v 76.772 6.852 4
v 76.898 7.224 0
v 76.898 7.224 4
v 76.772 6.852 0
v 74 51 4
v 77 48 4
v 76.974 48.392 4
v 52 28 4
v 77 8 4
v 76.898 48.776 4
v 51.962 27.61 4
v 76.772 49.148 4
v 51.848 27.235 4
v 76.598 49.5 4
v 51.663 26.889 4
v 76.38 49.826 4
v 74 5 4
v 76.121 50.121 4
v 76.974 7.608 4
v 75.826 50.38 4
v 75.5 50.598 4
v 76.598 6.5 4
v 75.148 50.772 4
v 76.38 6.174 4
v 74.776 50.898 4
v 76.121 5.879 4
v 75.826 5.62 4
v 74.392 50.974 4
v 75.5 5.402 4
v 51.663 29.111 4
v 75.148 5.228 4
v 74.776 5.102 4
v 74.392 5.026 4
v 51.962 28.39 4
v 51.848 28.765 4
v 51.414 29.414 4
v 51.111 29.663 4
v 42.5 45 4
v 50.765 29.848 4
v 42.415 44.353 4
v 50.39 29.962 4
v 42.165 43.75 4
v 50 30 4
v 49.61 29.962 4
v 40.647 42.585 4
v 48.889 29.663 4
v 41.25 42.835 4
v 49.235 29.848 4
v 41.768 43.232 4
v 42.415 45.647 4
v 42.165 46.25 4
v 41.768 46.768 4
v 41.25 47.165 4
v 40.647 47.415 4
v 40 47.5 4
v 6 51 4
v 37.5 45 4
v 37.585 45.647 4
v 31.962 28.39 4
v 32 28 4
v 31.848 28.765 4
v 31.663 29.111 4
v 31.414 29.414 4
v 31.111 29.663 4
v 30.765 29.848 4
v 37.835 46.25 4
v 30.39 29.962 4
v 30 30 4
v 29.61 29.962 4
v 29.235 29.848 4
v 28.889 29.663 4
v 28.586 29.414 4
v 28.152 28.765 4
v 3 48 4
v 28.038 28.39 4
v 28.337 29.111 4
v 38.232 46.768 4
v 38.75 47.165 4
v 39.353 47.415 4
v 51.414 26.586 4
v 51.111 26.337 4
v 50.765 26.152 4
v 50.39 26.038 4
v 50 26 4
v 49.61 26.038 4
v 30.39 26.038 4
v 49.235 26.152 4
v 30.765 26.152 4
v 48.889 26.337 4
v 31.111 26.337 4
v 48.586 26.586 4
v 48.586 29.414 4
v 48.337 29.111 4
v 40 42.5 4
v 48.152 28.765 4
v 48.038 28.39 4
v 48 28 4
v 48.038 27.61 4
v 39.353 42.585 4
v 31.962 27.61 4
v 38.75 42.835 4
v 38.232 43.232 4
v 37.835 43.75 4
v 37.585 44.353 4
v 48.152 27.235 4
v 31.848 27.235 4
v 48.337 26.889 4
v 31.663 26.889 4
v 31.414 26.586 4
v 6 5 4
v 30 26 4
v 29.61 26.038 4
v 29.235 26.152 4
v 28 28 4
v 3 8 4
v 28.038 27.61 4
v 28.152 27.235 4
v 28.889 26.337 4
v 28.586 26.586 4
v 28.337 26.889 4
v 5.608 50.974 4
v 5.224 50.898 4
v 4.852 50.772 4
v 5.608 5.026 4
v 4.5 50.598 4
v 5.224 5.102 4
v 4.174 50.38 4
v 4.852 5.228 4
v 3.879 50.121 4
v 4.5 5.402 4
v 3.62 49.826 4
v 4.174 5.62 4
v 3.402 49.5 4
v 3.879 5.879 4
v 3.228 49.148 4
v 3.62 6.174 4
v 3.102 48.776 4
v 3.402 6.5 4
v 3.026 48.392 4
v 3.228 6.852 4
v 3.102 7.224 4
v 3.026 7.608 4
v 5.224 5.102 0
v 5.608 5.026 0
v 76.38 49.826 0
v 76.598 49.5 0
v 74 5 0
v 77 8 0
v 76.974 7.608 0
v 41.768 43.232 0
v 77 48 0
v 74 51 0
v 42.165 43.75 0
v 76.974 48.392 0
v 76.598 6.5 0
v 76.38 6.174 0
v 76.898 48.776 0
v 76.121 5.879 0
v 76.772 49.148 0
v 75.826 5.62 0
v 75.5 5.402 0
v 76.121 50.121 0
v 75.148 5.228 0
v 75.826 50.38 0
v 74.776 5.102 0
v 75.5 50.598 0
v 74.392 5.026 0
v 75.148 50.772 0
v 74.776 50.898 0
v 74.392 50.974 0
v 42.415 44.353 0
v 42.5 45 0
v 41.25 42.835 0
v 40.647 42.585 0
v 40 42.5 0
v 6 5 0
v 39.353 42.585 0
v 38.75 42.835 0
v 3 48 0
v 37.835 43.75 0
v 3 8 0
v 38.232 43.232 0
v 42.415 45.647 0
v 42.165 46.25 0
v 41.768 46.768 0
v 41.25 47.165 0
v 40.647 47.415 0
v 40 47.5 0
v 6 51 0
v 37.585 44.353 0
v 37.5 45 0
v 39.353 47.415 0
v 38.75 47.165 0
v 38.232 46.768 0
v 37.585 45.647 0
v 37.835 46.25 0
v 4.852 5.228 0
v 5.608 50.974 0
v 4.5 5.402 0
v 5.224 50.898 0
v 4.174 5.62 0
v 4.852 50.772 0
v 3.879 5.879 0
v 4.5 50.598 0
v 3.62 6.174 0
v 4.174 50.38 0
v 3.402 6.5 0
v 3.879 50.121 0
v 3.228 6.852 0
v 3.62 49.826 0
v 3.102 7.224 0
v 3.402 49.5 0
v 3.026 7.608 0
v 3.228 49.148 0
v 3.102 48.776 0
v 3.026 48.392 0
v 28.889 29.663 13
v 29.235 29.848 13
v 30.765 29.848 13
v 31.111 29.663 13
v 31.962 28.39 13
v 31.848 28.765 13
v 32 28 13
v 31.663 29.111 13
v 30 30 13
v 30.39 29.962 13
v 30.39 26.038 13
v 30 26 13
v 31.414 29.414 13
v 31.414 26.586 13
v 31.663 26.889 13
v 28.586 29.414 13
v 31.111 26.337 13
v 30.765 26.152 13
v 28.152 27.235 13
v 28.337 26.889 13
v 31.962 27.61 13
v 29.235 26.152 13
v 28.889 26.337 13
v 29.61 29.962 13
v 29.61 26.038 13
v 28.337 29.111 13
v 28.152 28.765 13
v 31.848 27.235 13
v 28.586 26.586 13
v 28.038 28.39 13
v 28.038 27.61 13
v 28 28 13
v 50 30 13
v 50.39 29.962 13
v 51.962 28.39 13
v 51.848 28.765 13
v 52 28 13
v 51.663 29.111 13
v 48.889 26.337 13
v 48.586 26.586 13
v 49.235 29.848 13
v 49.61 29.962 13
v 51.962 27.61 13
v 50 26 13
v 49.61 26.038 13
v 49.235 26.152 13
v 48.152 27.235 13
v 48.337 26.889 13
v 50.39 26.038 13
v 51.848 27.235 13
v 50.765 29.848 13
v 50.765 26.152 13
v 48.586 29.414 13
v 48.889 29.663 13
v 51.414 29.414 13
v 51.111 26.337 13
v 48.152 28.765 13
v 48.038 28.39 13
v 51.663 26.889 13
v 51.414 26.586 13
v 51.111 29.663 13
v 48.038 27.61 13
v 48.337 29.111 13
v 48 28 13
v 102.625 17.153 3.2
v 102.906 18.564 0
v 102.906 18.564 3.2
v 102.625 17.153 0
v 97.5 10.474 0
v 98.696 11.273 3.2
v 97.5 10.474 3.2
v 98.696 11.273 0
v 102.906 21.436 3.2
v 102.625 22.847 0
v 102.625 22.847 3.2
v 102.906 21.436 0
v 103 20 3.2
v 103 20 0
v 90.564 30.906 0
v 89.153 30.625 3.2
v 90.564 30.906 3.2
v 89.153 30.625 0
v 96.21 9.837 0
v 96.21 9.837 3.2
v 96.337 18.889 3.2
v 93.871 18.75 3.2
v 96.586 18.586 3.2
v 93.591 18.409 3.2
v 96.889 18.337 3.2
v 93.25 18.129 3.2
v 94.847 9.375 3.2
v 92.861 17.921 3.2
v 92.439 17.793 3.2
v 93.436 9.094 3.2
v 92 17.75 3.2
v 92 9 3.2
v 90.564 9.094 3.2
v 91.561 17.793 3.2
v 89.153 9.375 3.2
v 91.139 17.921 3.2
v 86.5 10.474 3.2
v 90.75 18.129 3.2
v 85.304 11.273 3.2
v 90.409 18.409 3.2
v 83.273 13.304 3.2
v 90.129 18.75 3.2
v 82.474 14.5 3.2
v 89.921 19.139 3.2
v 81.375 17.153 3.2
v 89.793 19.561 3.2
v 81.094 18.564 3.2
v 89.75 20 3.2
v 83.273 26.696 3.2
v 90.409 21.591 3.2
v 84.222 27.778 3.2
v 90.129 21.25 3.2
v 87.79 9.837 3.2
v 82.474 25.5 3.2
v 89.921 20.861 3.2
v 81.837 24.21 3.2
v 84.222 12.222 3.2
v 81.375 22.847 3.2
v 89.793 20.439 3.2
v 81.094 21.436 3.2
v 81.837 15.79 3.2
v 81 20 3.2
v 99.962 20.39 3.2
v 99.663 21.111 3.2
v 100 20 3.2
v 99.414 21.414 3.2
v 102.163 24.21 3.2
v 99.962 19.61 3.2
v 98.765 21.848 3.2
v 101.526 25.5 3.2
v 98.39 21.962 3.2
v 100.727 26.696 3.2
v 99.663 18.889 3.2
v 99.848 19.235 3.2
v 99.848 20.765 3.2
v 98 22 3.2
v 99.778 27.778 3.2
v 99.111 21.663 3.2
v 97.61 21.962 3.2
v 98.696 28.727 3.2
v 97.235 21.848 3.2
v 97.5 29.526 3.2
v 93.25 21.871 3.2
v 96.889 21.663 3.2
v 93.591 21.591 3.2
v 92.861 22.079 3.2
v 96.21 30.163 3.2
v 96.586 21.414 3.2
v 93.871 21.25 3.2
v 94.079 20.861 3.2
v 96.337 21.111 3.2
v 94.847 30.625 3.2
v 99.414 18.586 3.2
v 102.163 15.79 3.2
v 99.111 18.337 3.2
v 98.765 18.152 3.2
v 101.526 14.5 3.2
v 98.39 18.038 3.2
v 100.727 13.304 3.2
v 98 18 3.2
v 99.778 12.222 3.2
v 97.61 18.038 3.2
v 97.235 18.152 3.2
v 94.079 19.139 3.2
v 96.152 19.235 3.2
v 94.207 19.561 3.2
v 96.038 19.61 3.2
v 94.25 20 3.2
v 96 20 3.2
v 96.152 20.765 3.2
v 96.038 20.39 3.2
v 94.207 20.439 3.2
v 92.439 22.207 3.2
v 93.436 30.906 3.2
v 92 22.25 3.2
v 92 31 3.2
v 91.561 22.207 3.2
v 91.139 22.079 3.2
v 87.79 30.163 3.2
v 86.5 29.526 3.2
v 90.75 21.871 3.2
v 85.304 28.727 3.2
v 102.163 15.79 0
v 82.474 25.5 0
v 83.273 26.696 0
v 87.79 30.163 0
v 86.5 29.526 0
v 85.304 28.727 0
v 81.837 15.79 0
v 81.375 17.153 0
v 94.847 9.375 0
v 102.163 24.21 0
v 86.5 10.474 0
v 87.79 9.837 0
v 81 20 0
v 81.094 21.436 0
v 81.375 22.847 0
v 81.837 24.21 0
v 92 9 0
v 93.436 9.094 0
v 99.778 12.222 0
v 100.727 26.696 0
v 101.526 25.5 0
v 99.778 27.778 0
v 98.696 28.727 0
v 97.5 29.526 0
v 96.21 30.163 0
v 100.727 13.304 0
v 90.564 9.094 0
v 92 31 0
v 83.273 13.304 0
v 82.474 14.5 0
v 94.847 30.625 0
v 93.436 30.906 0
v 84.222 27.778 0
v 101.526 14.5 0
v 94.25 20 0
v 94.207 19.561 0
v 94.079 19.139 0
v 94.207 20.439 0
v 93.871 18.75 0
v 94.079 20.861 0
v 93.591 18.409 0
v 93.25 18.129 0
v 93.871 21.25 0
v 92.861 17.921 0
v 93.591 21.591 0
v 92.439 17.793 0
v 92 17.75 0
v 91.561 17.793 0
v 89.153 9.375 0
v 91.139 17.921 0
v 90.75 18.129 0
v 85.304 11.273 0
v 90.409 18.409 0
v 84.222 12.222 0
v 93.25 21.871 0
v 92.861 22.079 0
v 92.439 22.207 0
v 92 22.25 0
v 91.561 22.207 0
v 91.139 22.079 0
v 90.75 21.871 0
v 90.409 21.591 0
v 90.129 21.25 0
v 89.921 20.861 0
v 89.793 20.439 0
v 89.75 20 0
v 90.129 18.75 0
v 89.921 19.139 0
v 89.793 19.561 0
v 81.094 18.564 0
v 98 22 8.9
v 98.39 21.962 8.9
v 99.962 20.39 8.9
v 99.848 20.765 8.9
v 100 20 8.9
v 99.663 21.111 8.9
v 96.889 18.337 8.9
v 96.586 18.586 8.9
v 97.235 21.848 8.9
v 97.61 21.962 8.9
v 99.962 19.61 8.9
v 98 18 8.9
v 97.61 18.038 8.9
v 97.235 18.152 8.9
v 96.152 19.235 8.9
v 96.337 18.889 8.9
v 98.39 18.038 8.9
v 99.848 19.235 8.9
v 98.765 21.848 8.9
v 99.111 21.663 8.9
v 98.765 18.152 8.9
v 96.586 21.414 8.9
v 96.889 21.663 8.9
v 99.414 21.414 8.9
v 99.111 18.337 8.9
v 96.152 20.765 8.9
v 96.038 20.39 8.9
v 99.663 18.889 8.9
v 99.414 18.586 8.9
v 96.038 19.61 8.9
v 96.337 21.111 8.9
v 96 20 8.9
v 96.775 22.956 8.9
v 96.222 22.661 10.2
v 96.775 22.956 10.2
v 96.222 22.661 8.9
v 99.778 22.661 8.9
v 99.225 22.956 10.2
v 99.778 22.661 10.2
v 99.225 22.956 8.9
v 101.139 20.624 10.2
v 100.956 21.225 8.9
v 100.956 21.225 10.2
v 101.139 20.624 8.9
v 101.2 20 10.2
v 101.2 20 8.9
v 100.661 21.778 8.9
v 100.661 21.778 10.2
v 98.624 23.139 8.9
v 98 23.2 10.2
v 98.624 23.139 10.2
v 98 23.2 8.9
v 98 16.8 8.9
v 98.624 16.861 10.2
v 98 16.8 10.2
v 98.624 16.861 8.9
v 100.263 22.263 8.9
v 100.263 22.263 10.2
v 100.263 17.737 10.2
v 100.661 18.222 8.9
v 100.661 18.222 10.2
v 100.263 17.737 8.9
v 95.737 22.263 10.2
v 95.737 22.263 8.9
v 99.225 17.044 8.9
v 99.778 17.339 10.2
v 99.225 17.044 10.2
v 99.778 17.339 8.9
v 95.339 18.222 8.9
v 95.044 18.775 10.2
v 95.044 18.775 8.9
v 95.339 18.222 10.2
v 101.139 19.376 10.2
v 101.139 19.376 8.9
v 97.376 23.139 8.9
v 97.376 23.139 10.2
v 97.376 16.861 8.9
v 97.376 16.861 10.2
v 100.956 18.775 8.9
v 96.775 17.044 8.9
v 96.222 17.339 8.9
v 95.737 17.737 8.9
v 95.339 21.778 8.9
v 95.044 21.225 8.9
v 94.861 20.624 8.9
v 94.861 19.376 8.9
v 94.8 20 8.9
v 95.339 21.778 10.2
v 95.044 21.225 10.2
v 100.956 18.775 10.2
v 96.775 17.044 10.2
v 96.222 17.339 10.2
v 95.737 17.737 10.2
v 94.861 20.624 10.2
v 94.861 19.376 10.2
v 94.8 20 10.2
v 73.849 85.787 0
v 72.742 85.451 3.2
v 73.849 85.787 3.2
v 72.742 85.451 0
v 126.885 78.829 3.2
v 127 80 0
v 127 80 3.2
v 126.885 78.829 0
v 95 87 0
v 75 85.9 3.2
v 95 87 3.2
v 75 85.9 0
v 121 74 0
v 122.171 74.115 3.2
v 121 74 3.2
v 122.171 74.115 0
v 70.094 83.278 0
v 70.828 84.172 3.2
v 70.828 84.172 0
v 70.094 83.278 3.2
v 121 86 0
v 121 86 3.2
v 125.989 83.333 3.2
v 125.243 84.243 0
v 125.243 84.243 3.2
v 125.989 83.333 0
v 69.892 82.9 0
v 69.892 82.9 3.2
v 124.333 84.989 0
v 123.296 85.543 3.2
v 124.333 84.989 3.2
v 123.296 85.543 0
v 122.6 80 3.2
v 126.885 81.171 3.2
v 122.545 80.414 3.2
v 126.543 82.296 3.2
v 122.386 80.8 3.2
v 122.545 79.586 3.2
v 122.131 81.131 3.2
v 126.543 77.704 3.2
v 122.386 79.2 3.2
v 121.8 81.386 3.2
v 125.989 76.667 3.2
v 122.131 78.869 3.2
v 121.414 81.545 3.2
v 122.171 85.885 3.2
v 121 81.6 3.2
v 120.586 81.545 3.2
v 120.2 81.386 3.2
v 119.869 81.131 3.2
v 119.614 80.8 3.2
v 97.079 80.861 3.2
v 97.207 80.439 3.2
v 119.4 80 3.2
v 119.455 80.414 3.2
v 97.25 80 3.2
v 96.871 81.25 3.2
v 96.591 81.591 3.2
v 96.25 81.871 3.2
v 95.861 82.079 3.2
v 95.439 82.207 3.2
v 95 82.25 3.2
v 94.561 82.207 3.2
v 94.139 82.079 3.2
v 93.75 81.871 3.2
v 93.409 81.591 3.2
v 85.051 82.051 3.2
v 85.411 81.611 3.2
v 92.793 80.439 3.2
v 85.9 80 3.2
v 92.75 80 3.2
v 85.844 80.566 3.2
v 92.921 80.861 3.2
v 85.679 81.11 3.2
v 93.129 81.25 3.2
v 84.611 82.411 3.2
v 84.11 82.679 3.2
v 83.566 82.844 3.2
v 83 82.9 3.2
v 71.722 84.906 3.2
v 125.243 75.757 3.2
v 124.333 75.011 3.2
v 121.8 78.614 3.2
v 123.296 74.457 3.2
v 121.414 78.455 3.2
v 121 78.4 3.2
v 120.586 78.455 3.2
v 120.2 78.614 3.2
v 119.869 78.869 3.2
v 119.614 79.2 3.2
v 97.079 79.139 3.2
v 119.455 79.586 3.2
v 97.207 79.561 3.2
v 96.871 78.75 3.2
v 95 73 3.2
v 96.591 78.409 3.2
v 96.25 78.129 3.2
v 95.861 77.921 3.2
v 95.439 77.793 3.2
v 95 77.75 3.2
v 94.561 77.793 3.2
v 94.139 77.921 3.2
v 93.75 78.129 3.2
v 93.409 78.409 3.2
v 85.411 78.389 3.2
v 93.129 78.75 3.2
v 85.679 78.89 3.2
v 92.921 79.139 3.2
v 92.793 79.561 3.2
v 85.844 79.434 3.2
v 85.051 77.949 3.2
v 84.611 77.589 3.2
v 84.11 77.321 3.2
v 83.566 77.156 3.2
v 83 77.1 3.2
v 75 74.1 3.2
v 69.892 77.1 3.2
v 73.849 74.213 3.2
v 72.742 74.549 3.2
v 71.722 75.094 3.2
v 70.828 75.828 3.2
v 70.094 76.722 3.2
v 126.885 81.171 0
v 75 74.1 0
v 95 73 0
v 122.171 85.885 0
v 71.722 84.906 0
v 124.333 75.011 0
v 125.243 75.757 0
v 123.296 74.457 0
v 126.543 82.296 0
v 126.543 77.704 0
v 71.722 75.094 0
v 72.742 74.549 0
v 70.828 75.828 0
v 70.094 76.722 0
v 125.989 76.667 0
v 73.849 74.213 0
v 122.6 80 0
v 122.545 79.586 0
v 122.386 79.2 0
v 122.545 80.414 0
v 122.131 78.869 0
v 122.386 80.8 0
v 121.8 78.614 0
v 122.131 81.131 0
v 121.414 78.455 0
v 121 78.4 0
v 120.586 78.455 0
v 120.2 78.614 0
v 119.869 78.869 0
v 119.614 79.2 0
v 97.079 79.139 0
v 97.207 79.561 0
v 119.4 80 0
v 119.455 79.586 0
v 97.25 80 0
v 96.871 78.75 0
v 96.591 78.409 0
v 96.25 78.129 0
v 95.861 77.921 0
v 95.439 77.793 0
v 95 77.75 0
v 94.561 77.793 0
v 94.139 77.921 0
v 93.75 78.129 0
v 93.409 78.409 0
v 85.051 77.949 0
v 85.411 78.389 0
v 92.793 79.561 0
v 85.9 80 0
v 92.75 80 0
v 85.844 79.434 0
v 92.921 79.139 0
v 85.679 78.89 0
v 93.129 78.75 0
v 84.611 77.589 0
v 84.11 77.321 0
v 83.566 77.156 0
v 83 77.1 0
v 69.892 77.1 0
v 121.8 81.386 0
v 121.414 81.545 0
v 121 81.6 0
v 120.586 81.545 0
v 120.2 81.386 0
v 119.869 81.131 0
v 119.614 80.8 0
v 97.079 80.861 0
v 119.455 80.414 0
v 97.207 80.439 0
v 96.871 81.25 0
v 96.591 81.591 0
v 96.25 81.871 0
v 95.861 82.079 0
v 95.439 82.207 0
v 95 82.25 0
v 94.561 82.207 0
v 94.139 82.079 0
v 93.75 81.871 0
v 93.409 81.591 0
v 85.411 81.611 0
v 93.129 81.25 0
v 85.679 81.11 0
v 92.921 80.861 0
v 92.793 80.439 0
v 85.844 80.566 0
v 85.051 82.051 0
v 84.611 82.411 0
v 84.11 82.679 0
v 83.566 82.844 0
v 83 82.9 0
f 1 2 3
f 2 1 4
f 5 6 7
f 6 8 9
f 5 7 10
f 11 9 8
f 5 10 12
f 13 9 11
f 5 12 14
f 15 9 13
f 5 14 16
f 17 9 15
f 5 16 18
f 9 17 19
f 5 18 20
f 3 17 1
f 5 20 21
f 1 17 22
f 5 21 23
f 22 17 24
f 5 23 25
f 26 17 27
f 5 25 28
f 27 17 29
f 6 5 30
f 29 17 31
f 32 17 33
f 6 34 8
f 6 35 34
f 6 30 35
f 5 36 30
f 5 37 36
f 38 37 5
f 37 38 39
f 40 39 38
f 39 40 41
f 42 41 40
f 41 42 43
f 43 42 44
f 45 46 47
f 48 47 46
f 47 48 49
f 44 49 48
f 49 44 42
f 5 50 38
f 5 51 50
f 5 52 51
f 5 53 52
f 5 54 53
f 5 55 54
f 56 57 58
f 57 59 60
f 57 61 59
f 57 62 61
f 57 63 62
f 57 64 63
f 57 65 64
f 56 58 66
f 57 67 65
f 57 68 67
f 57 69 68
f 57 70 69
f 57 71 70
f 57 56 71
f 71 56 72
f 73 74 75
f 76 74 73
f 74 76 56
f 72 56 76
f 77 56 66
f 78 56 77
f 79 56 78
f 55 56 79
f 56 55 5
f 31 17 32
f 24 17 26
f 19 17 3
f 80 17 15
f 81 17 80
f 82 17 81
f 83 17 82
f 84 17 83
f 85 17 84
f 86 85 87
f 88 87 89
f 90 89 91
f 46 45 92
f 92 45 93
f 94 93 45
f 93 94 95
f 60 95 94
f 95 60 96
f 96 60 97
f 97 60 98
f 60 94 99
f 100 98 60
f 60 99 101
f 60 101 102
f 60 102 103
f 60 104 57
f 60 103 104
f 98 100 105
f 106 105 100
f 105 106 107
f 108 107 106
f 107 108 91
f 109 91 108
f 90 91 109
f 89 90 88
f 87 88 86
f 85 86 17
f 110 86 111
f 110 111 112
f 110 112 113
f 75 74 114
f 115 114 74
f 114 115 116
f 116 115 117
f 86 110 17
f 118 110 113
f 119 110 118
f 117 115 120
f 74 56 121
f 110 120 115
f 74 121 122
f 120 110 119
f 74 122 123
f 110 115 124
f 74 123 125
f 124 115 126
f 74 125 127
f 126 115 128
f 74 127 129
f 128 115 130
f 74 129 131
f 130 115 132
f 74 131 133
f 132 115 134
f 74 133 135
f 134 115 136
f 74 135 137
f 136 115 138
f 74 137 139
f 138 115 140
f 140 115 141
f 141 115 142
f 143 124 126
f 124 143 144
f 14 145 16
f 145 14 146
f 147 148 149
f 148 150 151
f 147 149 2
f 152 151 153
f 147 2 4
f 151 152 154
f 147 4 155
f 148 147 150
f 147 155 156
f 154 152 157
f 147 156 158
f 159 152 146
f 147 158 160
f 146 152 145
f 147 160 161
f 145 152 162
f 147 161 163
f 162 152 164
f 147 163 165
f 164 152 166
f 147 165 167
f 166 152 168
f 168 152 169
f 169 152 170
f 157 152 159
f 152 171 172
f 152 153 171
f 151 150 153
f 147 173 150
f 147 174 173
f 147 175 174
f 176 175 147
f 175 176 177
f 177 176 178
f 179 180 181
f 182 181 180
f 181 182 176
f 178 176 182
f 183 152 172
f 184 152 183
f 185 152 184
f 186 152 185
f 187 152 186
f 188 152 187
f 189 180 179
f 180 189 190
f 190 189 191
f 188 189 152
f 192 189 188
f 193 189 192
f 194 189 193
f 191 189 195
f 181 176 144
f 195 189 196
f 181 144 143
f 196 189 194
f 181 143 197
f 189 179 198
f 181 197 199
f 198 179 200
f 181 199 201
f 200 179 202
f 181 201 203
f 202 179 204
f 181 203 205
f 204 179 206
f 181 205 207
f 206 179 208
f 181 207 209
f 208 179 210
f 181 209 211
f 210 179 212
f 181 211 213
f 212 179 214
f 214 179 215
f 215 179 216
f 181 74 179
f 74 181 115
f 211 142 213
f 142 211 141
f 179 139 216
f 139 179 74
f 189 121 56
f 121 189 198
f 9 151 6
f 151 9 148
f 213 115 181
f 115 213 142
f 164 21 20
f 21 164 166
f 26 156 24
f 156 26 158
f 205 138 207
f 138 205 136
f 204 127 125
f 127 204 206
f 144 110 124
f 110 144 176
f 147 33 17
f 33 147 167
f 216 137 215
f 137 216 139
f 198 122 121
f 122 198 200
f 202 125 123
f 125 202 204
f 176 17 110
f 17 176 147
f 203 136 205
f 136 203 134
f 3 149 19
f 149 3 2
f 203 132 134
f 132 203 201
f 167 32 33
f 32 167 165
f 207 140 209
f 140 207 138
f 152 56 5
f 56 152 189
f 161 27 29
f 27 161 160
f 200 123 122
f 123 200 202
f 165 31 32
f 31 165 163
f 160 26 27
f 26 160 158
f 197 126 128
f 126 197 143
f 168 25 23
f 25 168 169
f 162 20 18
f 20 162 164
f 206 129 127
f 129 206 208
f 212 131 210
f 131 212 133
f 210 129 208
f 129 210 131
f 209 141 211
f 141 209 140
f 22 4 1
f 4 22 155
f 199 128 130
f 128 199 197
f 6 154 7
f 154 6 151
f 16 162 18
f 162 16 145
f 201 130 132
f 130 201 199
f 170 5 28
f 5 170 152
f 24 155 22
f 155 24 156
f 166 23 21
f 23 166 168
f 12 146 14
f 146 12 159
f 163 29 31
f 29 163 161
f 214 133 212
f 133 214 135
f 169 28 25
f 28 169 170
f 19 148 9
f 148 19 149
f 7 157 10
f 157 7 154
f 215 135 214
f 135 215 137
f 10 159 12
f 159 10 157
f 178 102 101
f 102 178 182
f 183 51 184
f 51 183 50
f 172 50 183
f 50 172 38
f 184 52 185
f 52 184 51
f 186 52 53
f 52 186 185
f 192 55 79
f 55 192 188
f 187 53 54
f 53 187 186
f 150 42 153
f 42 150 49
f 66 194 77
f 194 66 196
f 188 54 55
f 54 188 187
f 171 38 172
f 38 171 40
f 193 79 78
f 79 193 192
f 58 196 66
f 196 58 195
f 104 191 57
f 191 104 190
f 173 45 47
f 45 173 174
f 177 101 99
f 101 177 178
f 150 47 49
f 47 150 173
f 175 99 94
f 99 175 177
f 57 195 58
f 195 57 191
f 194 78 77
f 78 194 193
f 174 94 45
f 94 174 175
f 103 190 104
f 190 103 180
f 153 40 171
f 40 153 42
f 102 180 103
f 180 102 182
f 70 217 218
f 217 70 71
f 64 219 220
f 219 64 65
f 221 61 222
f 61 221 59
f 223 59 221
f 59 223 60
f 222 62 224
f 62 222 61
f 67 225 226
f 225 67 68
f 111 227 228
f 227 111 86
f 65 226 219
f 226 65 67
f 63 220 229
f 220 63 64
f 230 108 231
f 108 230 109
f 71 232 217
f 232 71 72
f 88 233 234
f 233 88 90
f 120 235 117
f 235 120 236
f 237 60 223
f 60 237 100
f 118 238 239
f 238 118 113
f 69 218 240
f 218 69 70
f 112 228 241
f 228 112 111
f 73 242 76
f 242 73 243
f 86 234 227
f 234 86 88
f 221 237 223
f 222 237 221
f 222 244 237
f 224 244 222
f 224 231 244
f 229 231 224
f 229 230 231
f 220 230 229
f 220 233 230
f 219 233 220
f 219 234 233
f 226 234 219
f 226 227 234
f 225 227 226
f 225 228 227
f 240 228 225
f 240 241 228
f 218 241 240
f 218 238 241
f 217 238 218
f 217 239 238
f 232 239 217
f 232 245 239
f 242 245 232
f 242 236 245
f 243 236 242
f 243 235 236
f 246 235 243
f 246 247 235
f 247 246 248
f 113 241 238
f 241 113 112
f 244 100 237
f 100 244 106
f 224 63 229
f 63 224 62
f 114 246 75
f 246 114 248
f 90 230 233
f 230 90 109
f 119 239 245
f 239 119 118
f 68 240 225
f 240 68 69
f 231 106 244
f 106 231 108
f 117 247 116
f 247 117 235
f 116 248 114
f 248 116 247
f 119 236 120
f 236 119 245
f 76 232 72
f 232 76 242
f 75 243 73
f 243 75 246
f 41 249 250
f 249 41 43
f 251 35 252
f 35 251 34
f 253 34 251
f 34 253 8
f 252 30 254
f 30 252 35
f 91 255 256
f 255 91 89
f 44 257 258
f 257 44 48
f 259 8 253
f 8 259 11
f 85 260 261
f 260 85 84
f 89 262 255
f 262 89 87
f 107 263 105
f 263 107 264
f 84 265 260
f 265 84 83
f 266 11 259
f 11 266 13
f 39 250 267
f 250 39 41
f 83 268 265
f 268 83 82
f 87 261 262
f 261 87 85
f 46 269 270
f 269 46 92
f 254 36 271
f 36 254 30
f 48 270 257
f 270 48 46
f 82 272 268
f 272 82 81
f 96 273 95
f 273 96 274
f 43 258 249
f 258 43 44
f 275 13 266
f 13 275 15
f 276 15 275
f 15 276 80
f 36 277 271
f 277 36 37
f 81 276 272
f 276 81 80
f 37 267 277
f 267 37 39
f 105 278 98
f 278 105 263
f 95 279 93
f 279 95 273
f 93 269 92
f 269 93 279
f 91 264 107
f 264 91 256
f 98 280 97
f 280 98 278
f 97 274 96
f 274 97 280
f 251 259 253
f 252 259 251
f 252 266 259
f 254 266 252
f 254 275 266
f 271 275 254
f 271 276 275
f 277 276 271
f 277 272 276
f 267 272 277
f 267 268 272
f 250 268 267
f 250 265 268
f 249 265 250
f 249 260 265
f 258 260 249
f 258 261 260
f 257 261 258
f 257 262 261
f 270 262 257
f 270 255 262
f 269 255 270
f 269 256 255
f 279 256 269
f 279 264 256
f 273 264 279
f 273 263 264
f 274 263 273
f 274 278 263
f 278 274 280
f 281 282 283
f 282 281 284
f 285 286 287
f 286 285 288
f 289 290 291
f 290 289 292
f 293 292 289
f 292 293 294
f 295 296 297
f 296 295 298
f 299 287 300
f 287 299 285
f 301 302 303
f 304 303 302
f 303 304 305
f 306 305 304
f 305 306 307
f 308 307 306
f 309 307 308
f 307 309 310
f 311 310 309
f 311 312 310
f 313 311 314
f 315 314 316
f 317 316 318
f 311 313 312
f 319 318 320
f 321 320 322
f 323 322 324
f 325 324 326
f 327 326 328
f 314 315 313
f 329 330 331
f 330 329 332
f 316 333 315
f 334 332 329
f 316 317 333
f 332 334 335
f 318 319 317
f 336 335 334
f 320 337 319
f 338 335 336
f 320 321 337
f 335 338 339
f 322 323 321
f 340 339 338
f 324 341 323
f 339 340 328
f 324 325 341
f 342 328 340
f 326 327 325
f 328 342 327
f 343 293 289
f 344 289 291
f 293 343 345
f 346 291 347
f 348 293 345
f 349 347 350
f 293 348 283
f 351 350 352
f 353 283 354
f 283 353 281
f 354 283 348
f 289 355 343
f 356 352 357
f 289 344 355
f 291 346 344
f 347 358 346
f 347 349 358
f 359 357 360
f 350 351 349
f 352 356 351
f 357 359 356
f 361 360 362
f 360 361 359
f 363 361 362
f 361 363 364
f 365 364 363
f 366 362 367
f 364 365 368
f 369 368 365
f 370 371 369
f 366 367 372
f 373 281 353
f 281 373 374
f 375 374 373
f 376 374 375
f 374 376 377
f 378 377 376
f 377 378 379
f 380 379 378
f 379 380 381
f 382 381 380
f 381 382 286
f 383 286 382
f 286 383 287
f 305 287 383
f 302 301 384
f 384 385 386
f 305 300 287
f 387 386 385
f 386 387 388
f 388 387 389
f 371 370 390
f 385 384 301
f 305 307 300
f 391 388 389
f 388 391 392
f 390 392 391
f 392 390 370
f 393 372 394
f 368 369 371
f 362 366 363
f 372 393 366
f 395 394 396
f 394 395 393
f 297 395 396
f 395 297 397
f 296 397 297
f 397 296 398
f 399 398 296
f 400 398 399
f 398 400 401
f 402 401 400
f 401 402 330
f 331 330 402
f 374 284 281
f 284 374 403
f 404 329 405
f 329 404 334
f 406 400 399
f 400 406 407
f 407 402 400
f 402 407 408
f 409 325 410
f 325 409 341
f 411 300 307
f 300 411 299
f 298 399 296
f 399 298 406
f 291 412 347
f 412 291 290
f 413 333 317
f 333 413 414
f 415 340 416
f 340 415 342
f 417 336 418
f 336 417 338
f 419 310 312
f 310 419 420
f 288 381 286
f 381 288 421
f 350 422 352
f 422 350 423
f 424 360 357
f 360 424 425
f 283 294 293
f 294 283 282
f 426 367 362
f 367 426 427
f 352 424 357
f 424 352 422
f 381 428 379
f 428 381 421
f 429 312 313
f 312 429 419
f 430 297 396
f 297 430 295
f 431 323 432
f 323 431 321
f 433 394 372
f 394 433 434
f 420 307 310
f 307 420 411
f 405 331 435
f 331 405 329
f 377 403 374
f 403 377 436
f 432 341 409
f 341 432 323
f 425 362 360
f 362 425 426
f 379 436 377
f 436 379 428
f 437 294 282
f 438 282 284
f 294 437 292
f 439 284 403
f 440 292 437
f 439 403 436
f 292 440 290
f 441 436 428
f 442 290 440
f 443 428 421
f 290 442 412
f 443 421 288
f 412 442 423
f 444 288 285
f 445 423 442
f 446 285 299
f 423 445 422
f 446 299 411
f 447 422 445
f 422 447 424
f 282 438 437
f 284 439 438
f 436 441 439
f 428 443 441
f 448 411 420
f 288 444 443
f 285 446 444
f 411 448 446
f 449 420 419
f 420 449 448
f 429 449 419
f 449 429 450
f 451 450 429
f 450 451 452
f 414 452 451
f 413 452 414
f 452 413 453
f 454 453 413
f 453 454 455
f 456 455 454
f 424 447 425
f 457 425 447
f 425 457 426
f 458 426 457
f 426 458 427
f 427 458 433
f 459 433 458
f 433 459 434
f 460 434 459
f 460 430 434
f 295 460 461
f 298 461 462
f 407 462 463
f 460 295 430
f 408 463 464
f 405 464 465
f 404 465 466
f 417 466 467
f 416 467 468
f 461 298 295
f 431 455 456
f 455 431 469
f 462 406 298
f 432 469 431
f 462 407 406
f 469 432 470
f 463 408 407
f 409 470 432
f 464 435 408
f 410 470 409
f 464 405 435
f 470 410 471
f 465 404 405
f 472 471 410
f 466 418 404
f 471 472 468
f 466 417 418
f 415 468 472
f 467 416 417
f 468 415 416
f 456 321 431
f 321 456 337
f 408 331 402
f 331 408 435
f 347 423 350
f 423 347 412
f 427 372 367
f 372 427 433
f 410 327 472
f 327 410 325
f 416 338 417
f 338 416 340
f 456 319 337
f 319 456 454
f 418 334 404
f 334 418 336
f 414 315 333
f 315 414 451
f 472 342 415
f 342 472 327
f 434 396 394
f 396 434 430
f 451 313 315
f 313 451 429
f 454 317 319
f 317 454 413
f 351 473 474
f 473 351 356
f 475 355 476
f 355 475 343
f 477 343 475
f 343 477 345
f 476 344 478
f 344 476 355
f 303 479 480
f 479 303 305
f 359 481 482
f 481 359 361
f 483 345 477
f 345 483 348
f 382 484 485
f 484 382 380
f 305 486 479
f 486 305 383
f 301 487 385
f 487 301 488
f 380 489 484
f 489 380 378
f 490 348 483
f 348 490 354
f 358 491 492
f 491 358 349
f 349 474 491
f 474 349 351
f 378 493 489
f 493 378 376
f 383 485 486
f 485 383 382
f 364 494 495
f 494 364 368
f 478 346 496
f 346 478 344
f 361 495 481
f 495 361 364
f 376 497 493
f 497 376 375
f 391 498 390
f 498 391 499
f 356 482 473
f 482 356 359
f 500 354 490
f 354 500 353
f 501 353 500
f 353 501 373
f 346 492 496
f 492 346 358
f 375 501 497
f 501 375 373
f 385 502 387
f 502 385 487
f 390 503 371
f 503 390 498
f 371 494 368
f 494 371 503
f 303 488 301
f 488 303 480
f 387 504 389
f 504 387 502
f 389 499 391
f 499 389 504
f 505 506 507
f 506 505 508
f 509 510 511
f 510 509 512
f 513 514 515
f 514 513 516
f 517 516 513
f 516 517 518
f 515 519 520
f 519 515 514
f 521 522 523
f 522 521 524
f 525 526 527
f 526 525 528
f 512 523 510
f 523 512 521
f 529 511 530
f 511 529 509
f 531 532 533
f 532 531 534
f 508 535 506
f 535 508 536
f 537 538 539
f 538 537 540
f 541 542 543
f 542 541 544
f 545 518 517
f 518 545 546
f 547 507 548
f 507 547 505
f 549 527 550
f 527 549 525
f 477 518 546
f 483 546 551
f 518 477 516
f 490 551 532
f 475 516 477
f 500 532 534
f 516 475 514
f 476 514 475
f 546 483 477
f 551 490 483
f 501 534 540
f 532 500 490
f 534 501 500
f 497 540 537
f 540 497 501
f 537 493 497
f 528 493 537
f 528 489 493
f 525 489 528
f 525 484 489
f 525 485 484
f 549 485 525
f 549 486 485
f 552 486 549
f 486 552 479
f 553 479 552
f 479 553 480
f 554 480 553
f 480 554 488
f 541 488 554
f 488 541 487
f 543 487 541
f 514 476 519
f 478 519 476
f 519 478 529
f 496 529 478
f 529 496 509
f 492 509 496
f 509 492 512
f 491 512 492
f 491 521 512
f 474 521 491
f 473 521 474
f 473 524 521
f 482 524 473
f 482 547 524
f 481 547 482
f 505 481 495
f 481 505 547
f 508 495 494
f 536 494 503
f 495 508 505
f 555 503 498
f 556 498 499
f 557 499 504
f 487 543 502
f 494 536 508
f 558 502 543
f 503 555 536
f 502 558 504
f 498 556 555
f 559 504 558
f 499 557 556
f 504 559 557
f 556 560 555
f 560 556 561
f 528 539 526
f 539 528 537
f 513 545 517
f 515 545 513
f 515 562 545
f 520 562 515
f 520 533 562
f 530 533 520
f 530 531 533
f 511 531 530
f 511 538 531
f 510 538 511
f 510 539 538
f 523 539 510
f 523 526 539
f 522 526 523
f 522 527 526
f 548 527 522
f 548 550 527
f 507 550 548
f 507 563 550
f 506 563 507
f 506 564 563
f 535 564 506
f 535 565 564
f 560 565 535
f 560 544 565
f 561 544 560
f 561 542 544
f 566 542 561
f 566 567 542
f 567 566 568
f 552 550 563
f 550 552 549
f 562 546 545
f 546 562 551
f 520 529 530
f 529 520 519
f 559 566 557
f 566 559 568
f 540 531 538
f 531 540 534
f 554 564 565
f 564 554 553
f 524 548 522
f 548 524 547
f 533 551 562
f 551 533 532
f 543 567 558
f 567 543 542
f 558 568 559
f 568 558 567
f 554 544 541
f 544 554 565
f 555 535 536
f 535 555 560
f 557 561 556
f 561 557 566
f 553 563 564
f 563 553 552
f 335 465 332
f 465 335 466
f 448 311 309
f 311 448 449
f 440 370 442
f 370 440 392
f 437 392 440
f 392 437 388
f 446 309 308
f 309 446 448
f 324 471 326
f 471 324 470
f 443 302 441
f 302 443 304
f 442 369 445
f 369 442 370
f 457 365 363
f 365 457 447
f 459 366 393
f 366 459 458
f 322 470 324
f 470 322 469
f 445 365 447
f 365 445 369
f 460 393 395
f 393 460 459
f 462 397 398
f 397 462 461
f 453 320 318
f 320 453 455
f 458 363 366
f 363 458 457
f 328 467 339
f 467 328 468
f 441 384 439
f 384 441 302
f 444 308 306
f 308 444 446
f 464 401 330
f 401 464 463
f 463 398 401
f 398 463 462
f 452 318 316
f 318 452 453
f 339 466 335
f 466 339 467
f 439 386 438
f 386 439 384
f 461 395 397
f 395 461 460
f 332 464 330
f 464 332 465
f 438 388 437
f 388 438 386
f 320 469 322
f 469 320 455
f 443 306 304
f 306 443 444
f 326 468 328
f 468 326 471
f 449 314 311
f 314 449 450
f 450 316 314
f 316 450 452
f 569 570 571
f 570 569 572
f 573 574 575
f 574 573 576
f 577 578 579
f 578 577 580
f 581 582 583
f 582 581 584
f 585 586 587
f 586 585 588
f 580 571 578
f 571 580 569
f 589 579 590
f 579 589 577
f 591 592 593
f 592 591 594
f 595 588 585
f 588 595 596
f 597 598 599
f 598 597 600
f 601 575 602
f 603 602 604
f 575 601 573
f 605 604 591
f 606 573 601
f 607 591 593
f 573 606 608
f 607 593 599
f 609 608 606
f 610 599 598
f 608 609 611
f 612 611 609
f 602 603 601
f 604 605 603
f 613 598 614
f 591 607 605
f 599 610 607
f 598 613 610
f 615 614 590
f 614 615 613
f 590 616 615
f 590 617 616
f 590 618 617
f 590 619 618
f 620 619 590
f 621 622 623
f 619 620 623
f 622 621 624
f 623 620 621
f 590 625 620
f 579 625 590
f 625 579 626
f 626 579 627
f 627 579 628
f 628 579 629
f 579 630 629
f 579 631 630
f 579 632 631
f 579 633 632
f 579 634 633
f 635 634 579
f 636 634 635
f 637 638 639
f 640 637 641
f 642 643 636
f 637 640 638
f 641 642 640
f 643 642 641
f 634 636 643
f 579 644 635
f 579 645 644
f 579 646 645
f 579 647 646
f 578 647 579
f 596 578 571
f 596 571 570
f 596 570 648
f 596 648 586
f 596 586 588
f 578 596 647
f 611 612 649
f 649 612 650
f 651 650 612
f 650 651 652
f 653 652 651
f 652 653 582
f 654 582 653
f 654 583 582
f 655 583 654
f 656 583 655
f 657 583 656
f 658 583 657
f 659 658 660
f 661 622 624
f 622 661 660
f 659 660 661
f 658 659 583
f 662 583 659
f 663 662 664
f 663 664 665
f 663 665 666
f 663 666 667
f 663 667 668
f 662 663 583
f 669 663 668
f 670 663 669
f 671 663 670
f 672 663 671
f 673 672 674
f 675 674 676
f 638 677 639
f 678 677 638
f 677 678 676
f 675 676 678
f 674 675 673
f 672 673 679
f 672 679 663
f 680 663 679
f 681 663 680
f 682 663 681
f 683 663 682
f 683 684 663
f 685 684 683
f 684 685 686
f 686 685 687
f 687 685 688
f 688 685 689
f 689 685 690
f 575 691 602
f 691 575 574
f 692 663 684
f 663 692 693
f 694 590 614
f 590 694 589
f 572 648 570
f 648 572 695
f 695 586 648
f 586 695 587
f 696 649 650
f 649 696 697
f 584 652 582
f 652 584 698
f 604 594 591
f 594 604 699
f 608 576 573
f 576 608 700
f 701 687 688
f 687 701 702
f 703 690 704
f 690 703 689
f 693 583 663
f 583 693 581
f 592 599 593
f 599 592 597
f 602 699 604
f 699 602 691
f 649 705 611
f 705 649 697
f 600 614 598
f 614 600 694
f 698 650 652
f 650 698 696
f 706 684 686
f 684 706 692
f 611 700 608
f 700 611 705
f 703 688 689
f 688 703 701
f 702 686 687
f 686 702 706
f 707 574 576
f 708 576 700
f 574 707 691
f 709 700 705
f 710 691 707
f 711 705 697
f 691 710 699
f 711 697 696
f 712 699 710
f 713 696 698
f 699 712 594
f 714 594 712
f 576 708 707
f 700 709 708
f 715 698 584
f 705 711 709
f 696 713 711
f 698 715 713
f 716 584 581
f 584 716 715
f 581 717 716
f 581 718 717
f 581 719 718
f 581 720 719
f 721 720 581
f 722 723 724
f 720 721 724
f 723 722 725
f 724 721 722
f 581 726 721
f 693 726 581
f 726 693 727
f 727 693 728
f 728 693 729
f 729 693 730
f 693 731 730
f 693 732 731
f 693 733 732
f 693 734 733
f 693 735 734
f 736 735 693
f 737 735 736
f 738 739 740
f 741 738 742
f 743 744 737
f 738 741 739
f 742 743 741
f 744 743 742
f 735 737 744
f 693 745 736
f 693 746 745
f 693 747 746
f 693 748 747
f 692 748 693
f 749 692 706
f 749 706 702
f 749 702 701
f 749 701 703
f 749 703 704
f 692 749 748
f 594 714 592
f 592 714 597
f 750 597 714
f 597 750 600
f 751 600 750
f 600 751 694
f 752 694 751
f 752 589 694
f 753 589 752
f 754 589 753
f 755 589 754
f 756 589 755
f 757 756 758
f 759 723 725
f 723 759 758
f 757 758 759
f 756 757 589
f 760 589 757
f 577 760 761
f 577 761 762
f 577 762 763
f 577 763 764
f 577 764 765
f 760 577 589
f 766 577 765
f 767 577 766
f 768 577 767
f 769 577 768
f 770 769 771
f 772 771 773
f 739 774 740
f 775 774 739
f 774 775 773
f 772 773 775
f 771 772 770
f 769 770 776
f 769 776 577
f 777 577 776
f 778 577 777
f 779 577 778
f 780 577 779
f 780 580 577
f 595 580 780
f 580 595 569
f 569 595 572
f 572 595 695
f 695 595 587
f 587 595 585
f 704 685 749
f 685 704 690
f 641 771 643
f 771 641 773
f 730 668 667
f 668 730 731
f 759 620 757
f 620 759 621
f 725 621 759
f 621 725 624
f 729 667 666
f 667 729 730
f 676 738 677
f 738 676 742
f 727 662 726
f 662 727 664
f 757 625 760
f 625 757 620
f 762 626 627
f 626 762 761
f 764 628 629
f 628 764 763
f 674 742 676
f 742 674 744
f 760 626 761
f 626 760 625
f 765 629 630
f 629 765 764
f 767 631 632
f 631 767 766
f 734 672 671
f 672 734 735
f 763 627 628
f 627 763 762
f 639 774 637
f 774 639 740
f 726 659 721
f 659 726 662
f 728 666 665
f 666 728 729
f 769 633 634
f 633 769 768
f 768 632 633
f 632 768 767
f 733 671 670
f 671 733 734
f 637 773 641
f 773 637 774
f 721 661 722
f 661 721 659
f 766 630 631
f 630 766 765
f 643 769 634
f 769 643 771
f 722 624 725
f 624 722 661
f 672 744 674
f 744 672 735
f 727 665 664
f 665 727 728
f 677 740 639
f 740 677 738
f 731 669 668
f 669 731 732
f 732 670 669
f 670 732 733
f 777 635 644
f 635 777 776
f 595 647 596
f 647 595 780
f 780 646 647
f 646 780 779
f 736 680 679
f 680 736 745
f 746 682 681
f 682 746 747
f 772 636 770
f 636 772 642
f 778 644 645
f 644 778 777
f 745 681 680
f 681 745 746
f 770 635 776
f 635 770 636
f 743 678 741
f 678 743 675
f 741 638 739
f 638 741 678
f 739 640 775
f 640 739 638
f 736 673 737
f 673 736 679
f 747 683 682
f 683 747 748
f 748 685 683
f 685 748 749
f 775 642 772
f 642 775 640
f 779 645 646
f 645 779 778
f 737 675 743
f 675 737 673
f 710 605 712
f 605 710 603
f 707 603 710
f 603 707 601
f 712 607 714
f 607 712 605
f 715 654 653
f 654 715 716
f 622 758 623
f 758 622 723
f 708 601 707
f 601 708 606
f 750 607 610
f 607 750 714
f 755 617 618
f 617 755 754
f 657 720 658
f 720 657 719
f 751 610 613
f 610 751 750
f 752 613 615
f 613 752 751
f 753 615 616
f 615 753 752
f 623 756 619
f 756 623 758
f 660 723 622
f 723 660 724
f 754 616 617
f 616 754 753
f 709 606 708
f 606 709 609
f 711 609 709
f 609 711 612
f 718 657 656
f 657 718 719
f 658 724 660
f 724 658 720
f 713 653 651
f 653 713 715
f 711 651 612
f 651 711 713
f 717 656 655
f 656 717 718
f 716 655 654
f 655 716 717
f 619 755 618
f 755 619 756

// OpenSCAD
/*
Sample 135: Kurbel-Langloch-Schwinge — Kurbelradius 6 mm
Generated from the FDM Mechanical Sample Library.
Units: millimetres.

Override examples:
  openscad -o custom.stl -D 'view="plate"' -D 'render_fn=64' model.scad
  openscad -o preview.png -D 'view="assembly"' model.scad
*/
use <../../../library/fdm_mechanisms.scad>

render_fn = is_undef(render_fn) ? 48 : render_fn;
view = is_undef(view) ? "plate" : view;
$fn = render_fn;

sample_crank_rocker(
    view=view,
    crank_r=6,
    pivot_offset=20,
    slot_w=5.8,
    pin_d=4,
    rocker_r=26,
    plate_t=3.2
);
